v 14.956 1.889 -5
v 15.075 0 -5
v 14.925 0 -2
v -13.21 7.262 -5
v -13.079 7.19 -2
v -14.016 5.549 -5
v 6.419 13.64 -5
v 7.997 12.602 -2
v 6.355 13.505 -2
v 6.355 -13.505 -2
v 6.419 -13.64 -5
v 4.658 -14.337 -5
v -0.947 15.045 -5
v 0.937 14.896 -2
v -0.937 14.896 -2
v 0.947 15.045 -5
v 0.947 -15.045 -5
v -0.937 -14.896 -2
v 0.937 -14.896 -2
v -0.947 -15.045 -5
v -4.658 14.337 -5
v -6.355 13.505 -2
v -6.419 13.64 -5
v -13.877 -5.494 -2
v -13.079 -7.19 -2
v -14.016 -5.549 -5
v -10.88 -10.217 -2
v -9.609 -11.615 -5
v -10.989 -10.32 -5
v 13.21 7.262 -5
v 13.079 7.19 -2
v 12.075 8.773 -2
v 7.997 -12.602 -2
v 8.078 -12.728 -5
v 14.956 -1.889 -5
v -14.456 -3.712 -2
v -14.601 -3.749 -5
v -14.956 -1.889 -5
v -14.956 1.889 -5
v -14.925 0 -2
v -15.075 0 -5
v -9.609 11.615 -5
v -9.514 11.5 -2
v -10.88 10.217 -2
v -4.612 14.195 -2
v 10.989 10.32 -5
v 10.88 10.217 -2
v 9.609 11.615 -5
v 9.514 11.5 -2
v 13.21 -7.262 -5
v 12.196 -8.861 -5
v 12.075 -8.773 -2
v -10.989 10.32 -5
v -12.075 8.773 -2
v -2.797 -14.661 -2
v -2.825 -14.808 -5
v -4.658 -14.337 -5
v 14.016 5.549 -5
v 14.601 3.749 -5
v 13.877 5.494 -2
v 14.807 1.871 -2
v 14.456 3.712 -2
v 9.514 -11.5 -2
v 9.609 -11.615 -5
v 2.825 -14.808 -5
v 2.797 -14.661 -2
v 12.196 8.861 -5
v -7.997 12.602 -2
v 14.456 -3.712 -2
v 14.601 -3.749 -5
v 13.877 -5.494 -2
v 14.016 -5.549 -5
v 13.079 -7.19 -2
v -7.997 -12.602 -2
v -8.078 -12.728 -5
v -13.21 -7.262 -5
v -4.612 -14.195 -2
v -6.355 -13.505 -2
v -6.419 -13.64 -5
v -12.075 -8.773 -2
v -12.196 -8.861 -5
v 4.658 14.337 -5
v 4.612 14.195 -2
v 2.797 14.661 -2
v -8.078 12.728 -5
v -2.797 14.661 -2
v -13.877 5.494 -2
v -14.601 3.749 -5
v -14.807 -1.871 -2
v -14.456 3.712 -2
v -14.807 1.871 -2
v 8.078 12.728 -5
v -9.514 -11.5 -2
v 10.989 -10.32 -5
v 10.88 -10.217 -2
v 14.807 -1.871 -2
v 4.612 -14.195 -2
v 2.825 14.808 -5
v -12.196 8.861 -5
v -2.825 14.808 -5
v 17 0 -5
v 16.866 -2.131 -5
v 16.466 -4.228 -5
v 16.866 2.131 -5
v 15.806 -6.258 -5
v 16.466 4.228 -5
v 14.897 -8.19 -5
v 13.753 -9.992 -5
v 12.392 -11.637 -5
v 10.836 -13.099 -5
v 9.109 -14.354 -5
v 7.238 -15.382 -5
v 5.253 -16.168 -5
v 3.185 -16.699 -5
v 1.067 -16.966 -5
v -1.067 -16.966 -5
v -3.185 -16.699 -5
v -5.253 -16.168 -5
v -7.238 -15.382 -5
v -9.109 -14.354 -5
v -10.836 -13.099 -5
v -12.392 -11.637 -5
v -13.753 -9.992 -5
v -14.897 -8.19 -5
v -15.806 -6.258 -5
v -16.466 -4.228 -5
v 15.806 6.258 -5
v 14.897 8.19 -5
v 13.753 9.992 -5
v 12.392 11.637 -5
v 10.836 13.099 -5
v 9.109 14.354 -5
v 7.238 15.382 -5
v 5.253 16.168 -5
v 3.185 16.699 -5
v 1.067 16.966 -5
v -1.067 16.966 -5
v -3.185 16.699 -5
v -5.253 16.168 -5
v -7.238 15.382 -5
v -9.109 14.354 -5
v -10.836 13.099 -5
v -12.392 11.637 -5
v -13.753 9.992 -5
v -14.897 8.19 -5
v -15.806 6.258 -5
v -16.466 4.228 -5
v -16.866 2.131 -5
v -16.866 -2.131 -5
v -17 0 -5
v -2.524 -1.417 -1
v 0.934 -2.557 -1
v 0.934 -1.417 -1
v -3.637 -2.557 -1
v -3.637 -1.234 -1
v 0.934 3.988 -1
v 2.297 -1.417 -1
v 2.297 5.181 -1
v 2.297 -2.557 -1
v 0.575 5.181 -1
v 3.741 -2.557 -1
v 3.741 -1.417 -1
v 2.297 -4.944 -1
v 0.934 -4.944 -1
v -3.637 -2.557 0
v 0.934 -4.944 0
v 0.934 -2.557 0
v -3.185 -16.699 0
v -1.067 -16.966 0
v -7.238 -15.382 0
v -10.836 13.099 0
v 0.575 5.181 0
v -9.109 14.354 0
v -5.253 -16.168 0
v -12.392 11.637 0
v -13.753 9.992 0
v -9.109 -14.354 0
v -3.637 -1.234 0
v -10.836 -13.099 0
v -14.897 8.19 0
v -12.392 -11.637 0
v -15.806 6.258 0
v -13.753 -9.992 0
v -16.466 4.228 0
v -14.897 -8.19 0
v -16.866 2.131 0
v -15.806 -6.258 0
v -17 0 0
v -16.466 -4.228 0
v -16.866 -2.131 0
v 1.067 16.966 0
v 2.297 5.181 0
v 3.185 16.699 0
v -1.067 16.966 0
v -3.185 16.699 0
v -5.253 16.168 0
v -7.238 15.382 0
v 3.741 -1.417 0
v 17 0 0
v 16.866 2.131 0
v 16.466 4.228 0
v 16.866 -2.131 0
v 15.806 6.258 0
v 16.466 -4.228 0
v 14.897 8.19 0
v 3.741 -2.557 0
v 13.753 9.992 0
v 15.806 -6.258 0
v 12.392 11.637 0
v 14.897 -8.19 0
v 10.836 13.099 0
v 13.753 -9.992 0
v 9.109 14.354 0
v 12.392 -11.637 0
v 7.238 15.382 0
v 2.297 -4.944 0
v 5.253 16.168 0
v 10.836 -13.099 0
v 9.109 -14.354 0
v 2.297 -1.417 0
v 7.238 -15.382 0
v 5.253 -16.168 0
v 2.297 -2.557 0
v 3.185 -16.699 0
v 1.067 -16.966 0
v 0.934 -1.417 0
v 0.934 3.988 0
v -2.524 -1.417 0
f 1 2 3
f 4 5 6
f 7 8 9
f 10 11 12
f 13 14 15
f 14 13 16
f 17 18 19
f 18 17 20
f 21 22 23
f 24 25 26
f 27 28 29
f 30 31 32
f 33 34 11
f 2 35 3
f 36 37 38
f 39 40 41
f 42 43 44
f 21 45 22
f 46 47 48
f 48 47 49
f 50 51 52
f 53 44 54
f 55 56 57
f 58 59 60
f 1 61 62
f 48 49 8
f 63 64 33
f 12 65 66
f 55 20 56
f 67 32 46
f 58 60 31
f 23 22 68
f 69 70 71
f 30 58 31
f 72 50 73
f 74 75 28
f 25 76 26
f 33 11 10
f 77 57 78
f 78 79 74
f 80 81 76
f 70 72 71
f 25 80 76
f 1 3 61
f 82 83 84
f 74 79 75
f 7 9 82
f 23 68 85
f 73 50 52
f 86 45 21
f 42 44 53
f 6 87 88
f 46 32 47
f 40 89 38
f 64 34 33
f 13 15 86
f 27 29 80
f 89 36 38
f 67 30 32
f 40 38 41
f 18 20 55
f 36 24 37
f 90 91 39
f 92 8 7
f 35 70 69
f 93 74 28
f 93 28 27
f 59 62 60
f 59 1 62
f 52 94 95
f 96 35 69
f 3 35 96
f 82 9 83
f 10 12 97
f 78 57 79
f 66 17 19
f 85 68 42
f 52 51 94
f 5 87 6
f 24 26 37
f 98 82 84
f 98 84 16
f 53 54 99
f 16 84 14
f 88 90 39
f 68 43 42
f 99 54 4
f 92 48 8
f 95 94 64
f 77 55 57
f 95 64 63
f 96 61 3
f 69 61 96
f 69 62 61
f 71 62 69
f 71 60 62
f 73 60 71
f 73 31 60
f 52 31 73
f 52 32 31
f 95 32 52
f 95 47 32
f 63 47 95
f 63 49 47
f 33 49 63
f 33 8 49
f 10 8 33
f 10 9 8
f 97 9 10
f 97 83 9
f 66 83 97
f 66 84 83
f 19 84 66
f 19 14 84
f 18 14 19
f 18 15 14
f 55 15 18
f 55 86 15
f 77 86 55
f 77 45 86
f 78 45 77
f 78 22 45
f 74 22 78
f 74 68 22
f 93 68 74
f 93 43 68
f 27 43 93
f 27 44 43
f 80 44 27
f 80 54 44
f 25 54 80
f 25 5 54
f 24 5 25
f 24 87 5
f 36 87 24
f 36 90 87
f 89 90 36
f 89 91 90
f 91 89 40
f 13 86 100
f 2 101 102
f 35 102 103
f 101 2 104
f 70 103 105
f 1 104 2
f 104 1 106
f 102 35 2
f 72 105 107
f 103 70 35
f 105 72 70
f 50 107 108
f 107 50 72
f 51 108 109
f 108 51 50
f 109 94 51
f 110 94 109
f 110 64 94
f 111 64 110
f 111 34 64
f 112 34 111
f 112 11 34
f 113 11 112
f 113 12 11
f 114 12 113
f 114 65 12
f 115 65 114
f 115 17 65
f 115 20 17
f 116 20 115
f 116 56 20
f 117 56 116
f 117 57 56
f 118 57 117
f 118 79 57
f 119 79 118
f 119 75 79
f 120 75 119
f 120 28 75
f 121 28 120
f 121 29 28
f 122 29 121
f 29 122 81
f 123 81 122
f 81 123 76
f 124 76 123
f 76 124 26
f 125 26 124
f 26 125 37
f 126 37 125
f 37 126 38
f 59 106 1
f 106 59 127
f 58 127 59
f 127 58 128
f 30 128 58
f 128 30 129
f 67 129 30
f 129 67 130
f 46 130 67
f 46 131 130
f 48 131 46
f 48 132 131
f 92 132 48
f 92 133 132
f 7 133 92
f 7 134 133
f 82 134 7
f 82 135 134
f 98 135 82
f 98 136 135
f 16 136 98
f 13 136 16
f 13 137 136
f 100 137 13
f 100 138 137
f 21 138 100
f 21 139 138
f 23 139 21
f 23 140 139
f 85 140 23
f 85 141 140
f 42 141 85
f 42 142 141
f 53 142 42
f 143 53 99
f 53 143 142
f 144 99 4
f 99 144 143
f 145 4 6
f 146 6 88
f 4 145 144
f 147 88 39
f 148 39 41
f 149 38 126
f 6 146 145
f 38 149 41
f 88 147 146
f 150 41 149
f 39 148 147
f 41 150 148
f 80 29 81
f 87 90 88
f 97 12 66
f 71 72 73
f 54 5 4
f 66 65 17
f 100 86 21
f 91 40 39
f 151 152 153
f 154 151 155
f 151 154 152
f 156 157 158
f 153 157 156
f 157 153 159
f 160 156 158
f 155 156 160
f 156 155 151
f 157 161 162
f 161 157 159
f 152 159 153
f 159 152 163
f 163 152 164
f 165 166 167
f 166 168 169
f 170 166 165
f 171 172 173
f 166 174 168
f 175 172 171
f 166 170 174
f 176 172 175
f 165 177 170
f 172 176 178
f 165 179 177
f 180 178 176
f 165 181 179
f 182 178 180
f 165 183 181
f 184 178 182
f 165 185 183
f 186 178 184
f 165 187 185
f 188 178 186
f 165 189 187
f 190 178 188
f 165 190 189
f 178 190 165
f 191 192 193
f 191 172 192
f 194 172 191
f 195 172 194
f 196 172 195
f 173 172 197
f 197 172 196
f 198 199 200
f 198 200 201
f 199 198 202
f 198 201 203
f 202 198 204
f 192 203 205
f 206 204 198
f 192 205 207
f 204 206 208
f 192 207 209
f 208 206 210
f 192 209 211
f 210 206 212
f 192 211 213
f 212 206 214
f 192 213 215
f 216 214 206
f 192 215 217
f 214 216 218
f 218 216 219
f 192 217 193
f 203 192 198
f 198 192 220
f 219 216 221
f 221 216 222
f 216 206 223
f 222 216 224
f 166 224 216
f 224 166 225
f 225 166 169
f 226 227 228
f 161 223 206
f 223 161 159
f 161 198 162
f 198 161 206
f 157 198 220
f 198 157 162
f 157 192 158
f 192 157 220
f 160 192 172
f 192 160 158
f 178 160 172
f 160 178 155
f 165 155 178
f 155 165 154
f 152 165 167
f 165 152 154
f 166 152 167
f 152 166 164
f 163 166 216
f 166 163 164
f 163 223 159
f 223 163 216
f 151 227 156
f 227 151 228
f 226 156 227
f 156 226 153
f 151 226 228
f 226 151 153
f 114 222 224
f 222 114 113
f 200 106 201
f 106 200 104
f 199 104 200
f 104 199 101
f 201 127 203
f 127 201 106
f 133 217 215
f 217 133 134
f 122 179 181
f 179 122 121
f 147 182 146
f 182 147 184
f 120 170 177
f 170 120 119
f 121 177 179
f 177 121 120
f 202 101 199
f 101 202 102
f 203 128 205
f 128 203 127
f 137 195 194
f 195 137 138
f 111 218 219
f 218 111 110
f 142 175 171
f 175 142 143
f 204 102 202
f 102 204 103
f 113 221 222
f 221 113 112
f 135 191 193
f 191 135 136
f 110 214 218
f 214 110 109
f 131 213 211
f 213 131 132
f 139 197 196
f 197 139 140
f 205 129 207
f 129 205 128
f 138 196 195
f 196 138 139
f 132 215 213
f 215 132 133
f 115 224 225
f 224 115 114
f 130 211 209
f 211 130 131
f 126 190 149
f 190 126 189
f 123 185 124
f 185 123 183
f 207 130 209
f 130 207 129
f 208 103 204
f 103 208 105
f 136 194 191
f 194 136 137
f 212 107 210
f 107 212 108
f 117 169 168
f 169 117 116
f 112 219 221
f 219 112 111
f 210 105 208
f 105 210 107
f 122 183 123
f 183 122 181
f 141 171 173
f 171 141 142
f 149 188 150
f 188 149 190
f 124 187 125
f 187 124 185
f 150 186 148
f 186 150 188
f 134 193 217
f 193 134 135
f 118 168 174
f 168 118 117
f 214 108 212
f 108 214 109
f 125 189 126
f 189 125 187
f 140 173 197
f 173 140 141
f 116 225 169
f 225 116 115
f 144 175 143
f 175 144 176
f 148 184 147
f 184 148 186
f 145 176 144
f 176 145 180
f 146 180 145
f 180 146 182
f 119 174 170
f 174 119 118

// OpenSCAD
$fn = 50;


difference() {
	union() {
		translate(v = [0, 0, -5.0000000000]) {
			cylinder(h = 5, r = 17.0000000000);
		}
	}
	union() {
		#translate(v = [0, 0, -5.0000000000]) {
			cylinder(h = 3, r1 = 15.0750000000, r2 = 14.9250000000);
		}
		translate(v = [0, 0, -1]) {
			linear_extrude(height = 1) {
				text(font = "Impact", halign = "center", size = 10, text = "4", valign = "center");
			}
		}
	}
}
